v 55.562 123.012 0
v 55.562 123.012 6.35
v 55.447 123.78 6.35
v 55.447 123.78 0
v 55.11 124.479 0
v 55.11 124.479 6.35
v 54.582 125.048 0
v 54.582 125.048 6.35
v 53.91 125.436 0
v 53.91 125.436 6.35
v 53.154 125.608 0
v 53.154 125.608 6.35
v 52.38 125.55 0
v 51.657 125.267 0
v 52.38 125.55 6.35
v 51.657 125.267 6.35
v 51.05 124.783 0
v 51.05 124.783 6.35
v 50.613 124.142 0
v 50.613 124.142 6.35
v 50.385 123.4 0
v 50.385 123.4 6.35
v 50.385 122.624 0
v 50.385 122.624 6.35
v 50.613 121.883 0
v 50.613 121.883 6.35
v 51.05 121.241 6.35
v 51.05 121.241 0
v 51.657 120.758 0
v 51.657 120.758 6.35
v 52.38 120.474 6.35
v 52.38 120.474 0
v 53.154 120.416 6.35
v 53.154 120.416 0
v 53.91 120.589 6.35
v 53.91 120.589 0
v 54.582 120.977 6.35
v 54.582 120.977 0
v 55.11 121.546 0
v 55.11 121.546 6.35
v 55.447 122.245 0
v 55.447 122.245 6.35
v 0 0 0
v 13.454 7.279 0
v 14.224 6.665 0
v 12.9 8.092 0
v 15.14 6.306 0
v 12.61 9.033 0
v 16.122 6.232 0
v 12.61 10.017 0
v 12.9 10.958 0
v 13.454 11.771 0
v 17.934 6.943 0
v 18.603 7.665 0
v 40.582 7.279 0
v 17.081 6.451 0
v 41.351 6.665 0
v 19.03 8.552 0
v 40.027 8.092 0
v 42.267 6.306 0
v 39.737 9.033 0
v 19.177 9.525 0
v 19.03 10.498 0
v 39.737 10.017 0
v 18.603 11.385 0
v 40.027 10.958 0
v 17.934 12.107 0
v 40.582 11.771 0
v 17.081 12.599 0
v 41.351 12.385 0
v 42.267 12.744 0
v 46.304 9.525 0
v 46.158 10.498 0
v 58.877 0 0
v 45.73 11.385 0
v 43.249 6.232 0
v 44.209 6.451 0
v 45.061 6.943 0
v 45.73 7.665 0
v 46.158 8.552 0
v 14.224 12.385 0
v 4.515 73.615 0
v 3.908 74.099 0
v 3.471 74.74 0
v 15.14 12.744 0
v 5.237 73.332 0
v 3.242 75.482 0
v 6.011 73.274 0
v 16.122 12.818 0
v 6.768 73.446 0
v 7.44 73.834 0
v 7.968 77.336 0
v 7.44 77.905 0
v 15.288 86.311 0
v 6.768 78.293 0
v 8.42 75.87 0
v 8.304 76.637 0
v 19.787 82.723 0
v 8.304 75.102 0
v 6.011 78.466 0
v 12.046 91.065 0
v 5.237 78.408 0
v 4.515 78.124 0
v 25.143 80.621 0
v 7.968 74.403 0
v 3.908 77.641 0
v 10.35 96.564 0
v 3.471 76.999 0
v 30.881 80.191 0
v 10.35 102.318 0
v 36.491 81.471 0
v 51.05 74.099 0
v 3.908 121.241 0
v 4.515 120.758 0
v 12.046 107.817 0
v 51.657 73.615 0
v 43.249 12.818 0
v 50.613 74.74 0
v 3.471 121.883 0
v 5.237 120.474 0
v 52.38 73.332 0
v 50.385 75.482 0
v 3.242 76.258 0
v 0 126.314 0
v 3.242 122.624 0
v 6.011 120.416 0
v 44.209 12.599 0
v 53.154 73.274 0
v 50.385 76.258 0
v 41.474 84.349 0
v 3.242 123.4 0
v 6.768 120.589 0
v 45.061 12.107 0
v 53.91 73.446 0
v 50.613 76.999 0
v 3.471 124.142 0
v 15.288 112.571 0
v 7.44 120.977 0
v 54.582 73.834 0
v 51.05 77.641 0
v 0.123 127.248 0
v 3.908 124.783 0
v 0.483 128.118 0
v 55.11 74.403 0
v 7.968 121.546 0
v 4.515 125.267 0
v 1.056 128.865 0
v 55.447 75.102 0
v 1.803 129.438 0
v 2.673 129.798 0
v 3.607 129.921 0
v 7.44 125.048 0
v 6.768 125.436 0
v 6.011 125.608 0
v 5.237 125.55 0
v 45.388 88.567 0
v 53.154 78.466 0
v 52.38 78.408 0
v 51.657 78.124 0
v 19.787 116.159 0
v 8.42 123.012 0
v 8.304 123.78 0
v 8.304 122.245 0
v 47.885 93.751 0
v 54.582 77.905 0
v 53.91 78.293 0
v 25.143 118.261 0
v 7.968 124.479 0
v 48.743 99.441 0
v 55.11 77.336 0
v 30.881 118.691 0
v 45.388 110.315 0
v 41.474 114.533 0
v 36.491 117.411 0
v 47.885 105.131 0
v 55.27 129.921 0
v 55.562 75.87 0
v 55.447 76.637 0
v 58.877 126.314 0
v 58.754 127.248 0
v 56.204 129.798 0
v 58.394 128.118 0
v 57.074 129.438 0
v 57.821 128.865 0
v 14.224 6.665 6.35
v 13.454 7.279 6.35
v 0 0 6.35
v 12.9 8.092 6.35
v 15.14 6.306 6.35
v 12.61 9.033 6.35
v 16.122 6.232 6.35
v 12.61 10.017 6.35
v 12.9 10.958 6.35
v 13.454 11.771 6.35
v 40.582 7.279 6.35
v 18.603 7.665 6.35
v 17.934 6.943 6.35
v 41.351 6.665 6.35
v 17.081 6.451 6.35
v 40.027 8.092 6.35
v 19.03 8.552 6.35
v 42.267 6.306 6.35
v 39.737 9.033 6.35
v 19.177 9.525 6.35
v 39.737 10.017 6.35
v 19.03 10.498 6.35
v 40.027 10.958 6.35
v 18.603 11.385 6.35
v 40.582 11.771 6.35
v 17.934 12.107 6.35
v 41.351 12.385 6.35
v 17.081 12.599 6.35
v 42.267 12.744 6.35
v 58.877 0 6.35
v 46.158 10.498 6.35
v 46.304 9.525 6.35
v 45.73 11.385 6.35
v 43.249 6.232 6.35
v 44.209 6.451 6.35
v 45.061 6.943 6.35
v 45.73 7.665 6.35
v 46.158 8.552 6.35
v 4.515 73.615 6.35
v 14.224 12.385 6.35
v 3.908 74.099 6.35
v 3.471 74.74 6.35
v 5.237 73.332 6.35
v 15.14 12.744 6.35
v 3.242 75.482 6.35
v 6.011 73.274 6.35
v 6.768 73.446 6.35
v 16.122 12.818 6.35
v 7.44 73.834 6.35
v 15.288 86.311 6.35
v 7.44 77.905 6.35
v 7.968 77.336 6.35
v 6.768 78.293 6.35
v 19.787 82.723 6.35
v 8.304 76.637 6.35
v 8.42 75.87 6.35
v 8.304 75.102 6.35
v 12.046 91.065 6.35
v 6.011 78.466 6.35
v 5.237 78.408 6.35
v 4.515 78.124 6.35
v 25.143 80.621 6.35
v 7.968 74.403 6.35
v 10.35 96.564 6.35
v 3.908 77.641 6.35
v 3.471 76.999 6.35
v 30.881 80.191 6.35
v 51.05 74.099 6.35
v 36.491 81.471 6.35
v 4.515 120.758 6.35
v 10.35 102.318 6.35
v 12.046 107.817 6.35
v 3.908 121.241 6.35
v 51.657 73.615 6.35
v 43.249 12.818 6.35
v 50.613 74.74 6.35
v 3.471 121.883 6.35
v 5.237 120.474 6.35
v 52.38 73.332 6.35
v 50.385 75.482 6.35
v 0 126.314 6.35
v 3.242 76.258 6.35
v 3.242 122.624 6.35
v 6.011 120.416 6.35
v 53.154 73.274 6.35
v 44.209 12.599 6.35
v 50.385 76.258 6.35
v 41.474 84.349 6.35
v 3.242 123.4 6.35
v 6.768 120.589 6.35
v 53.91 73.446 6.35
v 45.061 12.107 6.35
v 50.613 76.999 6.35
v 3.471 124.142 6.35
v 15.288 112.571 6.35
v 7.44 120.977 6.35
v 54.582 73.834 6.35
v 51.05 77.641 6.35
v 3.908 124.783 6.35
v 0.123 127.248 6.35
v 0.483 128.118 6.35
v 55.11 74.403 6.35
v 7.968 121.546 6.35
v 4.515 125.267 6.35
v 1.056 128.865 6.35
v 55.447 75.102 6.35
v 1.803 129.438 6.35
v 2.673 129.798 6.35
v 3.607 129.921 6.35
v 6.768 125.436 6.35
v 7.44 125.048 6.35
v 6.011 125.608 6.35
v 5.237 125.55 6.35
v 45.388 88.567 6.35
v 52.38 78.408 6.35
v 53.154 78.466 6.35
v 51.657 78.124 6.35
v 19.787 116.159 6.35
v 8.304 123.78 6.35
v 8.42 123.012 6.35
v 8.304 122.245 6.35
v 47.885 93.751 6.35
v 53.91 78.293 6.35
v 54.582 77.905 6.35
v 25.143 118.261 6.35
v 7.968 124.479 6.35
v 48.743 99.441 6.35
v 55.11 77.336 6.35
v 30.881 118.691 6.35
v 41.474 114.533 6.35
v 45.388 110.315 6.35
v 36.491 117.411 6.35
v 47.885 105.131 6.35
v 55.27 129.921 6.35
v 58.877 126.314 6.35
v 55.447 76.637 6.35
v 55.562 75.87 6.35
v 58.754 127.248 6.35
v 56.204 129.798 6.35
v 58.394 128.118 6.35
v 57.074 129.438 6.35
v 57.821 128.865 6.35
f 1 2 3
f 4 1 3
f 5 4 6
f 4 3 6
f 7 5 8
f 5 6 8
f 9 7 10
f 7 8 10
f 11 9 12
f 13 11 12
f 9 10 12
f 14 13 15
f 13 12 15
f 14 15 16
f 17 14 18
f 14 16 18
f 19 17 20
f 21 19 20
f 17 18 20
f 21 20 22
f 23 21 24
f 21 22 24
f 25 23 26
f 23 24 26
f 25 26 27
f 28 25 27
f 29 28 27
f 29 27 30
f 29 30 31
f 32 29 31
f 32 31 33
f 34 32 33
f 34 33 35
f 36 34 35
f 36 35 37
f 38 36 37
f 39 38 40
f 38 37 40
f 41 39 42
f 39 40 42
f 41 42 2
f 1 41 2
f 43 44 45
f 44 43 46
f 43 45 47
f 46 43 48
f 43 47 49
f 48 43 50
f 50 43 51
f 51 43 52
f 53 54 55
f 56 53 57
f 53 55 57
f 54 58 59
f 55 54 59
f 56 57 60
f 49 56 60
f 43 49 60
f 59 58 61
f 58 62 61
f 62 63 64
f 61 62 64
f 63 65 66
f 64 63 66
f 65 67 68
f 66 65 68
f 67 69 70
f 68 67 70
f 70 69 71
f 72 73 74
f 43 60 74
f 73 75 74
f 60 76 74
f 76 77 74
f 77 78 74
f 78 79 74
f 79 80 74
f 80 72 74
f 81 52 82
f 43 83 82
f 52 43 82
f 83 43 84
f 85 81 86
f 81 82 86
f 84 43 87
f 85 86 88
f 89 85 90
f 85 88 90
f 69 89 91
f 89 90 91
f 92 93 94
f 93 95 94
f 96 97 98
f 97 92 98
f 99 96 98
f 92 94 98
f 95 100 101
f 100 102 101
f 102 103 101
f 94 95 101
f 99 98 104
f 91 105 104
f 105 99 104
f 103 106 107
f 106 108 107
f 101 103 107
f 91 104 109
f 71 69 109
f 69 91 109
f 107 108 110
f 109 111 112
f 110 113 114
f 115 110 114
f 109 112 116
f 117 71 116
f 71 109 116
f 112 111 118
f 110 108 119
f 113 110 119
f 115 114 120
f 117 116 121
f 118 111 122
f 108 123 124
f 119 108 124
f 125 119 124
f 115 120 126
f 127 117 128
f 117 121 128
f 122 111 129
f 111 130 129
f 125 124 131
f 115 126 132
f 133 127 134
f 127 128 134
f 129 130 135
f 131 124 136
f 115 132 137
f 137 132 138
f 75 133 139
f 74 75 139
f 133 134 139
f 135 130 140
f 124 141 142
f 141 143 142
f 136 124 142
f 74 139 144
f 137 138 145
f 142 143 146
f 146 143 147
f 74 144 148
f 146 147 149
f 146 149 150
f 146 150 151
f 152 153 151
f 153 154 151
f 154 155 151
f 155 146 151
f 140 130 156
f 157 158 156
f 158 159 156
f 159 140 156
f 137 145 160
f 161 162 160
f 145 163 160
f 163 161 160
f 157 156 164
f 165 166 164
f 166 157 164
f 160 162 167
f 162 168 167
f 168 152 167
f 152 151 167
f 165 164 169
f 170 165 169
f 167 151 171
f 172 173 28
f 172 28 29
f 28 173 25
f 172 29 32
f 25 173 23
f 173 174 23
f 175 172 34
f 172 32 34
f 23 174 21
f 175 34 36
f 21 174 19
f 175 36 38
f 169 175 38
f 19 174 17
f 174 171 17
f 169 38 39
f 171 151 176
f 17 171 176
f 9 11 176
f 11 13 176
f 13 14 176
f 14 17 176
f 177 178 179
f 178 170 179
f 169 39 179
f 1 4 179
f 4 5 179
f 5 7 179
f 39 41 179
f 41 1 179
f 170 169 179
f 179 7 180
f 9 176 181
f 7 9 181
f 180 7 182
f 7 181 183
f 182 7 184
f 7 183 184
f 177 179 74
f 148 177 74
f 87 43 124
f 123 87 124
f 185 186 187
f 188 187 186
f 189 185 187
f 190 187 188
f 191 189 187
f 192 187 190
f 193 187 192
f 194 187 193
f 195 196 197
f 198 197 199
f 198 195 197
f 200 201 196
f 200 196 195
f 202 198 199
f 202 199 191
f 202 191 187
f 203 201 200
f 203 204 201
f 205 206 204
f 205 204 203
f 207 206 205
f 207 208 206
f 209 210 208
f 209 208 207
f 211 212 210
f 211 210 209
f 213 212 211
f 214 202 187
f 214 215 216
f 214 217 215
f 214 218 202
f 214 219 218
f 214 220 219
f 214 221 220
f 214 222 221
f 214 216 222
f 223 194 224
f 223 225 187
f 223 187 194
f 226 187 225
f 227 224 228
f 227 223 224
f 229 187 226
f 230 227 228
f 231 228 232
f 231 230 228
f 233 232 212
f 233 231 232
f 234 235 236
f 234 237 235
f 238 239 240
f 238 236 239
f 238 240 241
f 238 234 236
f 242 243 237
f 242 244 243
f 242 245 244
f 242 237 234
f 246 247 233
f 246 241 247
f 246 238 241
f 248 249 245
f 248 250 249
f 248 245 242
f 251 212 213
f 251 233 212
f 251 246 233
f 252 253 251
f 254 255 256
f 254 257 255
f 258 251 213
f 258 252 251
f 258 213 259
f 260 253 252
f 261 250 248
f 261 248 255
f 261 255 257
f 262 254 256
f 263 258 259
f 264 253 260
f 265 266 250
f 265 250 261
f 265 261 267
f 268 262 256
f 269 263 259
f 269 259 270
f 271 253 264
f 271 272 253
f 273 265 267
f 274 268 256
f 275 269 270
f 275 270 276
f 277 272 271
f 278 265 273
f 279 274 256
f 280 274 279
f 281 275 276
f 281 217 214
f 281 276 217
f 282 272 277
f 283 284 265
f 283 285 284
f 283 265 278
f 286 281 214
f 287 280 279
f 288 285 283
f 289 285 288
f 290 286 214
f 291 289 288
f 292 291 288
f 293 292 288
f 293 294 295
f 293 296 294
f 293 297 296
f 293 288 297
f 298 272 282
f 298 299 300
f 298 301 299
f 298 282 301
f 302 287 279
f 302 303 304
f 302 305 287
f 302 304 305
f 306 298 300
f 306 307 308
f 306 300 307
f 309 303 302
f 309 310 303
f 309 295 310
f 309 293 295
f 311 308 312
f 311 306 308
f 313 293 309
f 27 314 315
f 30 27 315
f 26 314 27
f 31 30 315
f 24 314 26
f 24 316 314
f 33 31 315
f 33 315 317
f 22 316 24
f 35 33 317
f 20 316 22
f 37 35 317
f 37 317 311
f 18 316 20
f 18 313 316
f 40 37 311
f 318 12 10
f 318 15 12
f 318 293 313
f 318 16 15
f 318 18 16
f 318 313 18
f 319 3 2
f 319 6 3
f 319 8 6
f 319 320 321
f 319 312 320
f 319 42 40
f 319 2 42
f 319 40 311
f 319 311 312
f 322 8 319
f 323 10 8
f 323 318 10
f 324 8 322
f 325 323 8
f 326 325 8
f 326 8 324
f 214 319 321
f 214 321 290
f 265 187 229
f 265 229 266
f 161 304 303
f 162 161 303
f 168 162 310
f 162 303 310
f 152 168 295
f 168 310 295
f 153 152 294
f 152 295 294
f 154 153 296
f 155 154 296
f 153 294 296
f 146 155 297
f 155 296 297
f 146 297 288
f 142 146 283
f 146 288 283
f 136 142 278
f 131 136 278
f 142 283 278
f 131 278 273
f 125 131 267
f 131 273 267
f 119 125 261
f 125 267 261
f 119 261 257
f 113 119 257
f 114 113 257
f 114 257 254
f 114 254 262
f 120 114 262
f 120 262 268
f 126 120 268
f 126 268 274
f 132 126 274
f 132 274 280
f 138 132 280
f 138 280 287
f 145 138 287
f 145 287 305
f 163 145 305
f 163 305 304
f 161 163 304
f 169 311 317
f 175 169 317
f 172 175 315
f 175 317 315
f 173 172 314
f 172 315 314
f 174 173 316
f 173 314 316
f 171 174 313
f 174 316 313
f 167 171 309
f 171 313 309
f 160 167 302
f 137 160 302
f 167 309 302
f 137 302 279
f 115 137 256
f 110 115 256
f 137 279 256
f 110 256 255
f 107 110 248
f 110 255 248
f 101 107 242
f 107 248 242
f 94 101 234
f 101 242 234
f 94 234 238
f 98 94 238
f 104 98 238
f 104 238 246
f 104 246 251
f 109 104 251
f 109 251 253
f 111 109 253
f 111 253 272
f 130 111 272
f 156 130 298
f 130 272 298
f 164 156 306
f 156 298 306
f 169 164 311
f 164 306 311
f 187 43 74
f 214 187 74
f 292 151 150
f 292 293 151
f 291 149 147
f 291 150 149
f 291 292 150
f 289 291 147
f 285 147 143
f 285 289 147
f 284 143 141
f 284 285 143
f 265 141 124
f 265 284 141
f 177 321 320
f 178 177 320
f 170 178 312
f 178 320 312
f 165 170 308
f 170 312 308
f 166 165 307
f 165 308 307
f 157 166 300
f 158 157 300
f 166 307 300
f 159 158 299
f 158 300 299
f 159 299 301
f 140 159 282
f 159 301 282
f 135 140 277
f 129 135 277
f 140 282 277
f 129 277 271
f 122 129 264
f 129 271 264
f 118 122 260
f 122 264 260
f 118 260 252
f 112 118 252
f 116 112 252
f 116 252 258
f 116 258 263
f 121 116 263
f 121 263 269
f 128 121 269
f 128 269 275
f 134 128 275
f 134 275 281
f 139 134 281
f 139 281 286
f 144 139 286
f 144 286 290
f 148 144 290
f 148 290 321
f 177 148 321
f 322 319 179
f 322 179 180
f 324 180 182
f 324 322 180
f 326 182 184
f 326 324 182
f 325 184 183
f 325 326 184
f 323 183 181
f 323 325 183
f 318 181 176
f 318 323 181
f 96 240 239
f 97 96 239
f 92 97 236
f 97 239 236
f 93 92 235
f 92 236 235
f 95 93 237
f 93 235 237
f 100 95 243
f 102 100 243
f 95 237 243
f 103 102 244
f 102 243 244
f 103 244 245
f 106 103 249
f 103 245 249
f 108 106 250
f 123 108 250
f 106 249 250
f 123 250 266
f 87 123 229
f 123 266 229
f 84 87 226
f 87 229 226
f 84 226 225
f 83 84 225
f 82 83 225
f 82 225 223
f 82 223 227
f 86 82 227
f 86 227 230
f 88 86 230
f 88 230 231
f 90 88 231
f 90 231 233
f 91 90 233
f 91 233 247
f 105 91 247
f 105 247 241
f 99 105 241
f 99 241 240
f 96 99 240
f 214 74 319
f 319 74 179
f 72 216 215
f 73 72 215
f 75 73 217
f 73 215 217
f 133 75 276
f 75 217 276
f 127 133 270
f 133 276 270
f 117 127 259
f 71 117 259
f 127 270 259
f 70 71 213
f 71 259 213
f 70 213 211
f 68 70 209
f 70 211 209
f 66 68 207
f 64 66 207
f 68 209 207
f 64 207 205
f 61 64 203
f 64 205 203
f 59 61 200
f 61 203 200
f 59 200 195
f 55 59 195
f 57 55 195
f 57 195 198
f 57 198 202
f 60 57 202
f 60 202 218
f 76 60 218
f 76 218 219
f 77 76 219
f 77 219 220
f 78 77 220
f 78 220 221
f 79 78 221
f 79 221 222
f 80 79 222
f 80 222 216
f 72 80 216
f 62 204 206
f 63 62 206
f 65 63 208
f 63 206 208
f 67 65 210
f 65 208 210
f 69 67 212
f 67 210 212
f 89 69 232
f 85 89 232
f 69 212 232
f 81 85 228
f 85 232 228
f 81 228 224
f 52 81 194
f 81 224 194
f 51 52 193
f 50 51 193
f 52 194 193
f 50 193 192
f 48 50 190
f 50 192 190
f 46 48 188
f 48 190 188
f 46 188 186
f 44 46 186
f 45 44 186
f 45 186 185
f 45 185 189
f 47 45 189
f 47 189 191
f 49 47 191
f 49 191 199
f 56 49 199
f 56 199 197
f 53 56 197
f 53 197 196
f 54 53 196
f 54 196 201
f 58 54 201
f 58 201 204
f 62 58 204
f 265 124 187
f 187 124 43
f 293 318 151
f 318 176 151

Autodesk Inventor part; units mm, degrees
ref_plane "YZ Plane" through (0, 0, 0) normal (1, 0, 0) x (0, 1, 0)
ref_plane "XZ Plane" through (0, 0, 0) normal (0, 1, 0) x (-1, 0, 0)
ref_plane "XY Plane" through (0, 0, 0) normal (0, 0, 1) x (1, 0, 0)
sketch "Sketch1" plane through (0, 0, 0) normal (0, 0, 1) x (1, 0, 0)
  line L0 (0, 0) -> (58.8772, 0)
  line L1 (58.8772, 0) -> (58.8772, 129.921)
  line L2 (58.8772, 129.921) -> (0, 129.921)
  line L3 (0, 129.921) -> (0, 0)
  dimension "d0" = 58.8772
  dimension "d1" = 129.921
extrude "Stock Bar" add sketch "Sketch1" along normal blind 6.35
fillet "Round Edges" radius 3.6068 2 edges at (0, 129.921, 3.175) (58.8772, 129.921, 3.175)
sketch "Sketch2" plane through (0, 0, 6.35) normal (0, 0, 1) x (1, 0, 0)
  circle A0 centre (29.4386, 99.441) radius 19.304
  line L0 (58.8772, 129.921) -> (0, 129.921) projected
  line L1 (0, 129.921) -> (0, 0) projected
  line L2 (58.8772, 0) -> (58.8772, 129.921) projected
  line L3 (29.4386, 129.921) -> (29.4386, 0)
  line L4 (0, 0) -> (58.8772, 0) projected
  dimension "d4" = 38.608
  dimension "d32" = 99.441
extrude "Motor Hole" cut sketch "Sketch2" against normal blind 6.35 contours A0 L3 | L3 A0
sketch "Sketch3" plane through (0, 0, 6.35) normal (0, 0, 1) x (1, 0, 0)
  circle A0 centre (5.8166, 123.0122) radius 2.6035
  line L0 (58.8772, 129.921) -> (0, 129.921) projected
  line L1 (0, 129.921) -> (0, 0) projected
  circle A1 centre (5.8166, 75.8698) radius 2.6035
  circle A2 centre (52.959, 123.0122) radius 2.6035
  circle A3 centre (52.959, 75.8698) radius 2.6035
  line L2 (0, 0) -> (58.8772, 0) projected
  dimension "d10" = 5.207
  dimension "d15" = 47.1424
  dimension "d18" = 47.1424
  dimension "d33" = 123.0122
  dimension "d34" = 5.8166
extrude "Motor Mounting Holes" cut sketch "Sketch3" against normal blind 6.35
sketch "Sketch4" plane through (0, 0, 6.35) normal (0, 0, 1) x (1, 0, 0)
  circle A0 centre (15.875, 9.525) radius 3.302
  circle A1 centre (43.0022, 9.525) radius 3.302
  line L0 (0, 0) -> (58.8772, 0) projected
  line L1 (58.8772, 0) -> (58.8772, 126.3142) projected
  line L2 (0, 126.3142) -> (0, 0) projected
  dimension "d24" = 6.604
  dimension "d25" = 6.604
  dimension "d26" = 9.525
  dimension "d27" = 9.525
  dimension "d28" = 15.875
  dimension "d29" = 15.875
extrude "Motor Support Mounting Holes" cut sketch "Sketch4" against normal blind 25.4
properties part number "Motor Support" material "Aluminum 6061"
